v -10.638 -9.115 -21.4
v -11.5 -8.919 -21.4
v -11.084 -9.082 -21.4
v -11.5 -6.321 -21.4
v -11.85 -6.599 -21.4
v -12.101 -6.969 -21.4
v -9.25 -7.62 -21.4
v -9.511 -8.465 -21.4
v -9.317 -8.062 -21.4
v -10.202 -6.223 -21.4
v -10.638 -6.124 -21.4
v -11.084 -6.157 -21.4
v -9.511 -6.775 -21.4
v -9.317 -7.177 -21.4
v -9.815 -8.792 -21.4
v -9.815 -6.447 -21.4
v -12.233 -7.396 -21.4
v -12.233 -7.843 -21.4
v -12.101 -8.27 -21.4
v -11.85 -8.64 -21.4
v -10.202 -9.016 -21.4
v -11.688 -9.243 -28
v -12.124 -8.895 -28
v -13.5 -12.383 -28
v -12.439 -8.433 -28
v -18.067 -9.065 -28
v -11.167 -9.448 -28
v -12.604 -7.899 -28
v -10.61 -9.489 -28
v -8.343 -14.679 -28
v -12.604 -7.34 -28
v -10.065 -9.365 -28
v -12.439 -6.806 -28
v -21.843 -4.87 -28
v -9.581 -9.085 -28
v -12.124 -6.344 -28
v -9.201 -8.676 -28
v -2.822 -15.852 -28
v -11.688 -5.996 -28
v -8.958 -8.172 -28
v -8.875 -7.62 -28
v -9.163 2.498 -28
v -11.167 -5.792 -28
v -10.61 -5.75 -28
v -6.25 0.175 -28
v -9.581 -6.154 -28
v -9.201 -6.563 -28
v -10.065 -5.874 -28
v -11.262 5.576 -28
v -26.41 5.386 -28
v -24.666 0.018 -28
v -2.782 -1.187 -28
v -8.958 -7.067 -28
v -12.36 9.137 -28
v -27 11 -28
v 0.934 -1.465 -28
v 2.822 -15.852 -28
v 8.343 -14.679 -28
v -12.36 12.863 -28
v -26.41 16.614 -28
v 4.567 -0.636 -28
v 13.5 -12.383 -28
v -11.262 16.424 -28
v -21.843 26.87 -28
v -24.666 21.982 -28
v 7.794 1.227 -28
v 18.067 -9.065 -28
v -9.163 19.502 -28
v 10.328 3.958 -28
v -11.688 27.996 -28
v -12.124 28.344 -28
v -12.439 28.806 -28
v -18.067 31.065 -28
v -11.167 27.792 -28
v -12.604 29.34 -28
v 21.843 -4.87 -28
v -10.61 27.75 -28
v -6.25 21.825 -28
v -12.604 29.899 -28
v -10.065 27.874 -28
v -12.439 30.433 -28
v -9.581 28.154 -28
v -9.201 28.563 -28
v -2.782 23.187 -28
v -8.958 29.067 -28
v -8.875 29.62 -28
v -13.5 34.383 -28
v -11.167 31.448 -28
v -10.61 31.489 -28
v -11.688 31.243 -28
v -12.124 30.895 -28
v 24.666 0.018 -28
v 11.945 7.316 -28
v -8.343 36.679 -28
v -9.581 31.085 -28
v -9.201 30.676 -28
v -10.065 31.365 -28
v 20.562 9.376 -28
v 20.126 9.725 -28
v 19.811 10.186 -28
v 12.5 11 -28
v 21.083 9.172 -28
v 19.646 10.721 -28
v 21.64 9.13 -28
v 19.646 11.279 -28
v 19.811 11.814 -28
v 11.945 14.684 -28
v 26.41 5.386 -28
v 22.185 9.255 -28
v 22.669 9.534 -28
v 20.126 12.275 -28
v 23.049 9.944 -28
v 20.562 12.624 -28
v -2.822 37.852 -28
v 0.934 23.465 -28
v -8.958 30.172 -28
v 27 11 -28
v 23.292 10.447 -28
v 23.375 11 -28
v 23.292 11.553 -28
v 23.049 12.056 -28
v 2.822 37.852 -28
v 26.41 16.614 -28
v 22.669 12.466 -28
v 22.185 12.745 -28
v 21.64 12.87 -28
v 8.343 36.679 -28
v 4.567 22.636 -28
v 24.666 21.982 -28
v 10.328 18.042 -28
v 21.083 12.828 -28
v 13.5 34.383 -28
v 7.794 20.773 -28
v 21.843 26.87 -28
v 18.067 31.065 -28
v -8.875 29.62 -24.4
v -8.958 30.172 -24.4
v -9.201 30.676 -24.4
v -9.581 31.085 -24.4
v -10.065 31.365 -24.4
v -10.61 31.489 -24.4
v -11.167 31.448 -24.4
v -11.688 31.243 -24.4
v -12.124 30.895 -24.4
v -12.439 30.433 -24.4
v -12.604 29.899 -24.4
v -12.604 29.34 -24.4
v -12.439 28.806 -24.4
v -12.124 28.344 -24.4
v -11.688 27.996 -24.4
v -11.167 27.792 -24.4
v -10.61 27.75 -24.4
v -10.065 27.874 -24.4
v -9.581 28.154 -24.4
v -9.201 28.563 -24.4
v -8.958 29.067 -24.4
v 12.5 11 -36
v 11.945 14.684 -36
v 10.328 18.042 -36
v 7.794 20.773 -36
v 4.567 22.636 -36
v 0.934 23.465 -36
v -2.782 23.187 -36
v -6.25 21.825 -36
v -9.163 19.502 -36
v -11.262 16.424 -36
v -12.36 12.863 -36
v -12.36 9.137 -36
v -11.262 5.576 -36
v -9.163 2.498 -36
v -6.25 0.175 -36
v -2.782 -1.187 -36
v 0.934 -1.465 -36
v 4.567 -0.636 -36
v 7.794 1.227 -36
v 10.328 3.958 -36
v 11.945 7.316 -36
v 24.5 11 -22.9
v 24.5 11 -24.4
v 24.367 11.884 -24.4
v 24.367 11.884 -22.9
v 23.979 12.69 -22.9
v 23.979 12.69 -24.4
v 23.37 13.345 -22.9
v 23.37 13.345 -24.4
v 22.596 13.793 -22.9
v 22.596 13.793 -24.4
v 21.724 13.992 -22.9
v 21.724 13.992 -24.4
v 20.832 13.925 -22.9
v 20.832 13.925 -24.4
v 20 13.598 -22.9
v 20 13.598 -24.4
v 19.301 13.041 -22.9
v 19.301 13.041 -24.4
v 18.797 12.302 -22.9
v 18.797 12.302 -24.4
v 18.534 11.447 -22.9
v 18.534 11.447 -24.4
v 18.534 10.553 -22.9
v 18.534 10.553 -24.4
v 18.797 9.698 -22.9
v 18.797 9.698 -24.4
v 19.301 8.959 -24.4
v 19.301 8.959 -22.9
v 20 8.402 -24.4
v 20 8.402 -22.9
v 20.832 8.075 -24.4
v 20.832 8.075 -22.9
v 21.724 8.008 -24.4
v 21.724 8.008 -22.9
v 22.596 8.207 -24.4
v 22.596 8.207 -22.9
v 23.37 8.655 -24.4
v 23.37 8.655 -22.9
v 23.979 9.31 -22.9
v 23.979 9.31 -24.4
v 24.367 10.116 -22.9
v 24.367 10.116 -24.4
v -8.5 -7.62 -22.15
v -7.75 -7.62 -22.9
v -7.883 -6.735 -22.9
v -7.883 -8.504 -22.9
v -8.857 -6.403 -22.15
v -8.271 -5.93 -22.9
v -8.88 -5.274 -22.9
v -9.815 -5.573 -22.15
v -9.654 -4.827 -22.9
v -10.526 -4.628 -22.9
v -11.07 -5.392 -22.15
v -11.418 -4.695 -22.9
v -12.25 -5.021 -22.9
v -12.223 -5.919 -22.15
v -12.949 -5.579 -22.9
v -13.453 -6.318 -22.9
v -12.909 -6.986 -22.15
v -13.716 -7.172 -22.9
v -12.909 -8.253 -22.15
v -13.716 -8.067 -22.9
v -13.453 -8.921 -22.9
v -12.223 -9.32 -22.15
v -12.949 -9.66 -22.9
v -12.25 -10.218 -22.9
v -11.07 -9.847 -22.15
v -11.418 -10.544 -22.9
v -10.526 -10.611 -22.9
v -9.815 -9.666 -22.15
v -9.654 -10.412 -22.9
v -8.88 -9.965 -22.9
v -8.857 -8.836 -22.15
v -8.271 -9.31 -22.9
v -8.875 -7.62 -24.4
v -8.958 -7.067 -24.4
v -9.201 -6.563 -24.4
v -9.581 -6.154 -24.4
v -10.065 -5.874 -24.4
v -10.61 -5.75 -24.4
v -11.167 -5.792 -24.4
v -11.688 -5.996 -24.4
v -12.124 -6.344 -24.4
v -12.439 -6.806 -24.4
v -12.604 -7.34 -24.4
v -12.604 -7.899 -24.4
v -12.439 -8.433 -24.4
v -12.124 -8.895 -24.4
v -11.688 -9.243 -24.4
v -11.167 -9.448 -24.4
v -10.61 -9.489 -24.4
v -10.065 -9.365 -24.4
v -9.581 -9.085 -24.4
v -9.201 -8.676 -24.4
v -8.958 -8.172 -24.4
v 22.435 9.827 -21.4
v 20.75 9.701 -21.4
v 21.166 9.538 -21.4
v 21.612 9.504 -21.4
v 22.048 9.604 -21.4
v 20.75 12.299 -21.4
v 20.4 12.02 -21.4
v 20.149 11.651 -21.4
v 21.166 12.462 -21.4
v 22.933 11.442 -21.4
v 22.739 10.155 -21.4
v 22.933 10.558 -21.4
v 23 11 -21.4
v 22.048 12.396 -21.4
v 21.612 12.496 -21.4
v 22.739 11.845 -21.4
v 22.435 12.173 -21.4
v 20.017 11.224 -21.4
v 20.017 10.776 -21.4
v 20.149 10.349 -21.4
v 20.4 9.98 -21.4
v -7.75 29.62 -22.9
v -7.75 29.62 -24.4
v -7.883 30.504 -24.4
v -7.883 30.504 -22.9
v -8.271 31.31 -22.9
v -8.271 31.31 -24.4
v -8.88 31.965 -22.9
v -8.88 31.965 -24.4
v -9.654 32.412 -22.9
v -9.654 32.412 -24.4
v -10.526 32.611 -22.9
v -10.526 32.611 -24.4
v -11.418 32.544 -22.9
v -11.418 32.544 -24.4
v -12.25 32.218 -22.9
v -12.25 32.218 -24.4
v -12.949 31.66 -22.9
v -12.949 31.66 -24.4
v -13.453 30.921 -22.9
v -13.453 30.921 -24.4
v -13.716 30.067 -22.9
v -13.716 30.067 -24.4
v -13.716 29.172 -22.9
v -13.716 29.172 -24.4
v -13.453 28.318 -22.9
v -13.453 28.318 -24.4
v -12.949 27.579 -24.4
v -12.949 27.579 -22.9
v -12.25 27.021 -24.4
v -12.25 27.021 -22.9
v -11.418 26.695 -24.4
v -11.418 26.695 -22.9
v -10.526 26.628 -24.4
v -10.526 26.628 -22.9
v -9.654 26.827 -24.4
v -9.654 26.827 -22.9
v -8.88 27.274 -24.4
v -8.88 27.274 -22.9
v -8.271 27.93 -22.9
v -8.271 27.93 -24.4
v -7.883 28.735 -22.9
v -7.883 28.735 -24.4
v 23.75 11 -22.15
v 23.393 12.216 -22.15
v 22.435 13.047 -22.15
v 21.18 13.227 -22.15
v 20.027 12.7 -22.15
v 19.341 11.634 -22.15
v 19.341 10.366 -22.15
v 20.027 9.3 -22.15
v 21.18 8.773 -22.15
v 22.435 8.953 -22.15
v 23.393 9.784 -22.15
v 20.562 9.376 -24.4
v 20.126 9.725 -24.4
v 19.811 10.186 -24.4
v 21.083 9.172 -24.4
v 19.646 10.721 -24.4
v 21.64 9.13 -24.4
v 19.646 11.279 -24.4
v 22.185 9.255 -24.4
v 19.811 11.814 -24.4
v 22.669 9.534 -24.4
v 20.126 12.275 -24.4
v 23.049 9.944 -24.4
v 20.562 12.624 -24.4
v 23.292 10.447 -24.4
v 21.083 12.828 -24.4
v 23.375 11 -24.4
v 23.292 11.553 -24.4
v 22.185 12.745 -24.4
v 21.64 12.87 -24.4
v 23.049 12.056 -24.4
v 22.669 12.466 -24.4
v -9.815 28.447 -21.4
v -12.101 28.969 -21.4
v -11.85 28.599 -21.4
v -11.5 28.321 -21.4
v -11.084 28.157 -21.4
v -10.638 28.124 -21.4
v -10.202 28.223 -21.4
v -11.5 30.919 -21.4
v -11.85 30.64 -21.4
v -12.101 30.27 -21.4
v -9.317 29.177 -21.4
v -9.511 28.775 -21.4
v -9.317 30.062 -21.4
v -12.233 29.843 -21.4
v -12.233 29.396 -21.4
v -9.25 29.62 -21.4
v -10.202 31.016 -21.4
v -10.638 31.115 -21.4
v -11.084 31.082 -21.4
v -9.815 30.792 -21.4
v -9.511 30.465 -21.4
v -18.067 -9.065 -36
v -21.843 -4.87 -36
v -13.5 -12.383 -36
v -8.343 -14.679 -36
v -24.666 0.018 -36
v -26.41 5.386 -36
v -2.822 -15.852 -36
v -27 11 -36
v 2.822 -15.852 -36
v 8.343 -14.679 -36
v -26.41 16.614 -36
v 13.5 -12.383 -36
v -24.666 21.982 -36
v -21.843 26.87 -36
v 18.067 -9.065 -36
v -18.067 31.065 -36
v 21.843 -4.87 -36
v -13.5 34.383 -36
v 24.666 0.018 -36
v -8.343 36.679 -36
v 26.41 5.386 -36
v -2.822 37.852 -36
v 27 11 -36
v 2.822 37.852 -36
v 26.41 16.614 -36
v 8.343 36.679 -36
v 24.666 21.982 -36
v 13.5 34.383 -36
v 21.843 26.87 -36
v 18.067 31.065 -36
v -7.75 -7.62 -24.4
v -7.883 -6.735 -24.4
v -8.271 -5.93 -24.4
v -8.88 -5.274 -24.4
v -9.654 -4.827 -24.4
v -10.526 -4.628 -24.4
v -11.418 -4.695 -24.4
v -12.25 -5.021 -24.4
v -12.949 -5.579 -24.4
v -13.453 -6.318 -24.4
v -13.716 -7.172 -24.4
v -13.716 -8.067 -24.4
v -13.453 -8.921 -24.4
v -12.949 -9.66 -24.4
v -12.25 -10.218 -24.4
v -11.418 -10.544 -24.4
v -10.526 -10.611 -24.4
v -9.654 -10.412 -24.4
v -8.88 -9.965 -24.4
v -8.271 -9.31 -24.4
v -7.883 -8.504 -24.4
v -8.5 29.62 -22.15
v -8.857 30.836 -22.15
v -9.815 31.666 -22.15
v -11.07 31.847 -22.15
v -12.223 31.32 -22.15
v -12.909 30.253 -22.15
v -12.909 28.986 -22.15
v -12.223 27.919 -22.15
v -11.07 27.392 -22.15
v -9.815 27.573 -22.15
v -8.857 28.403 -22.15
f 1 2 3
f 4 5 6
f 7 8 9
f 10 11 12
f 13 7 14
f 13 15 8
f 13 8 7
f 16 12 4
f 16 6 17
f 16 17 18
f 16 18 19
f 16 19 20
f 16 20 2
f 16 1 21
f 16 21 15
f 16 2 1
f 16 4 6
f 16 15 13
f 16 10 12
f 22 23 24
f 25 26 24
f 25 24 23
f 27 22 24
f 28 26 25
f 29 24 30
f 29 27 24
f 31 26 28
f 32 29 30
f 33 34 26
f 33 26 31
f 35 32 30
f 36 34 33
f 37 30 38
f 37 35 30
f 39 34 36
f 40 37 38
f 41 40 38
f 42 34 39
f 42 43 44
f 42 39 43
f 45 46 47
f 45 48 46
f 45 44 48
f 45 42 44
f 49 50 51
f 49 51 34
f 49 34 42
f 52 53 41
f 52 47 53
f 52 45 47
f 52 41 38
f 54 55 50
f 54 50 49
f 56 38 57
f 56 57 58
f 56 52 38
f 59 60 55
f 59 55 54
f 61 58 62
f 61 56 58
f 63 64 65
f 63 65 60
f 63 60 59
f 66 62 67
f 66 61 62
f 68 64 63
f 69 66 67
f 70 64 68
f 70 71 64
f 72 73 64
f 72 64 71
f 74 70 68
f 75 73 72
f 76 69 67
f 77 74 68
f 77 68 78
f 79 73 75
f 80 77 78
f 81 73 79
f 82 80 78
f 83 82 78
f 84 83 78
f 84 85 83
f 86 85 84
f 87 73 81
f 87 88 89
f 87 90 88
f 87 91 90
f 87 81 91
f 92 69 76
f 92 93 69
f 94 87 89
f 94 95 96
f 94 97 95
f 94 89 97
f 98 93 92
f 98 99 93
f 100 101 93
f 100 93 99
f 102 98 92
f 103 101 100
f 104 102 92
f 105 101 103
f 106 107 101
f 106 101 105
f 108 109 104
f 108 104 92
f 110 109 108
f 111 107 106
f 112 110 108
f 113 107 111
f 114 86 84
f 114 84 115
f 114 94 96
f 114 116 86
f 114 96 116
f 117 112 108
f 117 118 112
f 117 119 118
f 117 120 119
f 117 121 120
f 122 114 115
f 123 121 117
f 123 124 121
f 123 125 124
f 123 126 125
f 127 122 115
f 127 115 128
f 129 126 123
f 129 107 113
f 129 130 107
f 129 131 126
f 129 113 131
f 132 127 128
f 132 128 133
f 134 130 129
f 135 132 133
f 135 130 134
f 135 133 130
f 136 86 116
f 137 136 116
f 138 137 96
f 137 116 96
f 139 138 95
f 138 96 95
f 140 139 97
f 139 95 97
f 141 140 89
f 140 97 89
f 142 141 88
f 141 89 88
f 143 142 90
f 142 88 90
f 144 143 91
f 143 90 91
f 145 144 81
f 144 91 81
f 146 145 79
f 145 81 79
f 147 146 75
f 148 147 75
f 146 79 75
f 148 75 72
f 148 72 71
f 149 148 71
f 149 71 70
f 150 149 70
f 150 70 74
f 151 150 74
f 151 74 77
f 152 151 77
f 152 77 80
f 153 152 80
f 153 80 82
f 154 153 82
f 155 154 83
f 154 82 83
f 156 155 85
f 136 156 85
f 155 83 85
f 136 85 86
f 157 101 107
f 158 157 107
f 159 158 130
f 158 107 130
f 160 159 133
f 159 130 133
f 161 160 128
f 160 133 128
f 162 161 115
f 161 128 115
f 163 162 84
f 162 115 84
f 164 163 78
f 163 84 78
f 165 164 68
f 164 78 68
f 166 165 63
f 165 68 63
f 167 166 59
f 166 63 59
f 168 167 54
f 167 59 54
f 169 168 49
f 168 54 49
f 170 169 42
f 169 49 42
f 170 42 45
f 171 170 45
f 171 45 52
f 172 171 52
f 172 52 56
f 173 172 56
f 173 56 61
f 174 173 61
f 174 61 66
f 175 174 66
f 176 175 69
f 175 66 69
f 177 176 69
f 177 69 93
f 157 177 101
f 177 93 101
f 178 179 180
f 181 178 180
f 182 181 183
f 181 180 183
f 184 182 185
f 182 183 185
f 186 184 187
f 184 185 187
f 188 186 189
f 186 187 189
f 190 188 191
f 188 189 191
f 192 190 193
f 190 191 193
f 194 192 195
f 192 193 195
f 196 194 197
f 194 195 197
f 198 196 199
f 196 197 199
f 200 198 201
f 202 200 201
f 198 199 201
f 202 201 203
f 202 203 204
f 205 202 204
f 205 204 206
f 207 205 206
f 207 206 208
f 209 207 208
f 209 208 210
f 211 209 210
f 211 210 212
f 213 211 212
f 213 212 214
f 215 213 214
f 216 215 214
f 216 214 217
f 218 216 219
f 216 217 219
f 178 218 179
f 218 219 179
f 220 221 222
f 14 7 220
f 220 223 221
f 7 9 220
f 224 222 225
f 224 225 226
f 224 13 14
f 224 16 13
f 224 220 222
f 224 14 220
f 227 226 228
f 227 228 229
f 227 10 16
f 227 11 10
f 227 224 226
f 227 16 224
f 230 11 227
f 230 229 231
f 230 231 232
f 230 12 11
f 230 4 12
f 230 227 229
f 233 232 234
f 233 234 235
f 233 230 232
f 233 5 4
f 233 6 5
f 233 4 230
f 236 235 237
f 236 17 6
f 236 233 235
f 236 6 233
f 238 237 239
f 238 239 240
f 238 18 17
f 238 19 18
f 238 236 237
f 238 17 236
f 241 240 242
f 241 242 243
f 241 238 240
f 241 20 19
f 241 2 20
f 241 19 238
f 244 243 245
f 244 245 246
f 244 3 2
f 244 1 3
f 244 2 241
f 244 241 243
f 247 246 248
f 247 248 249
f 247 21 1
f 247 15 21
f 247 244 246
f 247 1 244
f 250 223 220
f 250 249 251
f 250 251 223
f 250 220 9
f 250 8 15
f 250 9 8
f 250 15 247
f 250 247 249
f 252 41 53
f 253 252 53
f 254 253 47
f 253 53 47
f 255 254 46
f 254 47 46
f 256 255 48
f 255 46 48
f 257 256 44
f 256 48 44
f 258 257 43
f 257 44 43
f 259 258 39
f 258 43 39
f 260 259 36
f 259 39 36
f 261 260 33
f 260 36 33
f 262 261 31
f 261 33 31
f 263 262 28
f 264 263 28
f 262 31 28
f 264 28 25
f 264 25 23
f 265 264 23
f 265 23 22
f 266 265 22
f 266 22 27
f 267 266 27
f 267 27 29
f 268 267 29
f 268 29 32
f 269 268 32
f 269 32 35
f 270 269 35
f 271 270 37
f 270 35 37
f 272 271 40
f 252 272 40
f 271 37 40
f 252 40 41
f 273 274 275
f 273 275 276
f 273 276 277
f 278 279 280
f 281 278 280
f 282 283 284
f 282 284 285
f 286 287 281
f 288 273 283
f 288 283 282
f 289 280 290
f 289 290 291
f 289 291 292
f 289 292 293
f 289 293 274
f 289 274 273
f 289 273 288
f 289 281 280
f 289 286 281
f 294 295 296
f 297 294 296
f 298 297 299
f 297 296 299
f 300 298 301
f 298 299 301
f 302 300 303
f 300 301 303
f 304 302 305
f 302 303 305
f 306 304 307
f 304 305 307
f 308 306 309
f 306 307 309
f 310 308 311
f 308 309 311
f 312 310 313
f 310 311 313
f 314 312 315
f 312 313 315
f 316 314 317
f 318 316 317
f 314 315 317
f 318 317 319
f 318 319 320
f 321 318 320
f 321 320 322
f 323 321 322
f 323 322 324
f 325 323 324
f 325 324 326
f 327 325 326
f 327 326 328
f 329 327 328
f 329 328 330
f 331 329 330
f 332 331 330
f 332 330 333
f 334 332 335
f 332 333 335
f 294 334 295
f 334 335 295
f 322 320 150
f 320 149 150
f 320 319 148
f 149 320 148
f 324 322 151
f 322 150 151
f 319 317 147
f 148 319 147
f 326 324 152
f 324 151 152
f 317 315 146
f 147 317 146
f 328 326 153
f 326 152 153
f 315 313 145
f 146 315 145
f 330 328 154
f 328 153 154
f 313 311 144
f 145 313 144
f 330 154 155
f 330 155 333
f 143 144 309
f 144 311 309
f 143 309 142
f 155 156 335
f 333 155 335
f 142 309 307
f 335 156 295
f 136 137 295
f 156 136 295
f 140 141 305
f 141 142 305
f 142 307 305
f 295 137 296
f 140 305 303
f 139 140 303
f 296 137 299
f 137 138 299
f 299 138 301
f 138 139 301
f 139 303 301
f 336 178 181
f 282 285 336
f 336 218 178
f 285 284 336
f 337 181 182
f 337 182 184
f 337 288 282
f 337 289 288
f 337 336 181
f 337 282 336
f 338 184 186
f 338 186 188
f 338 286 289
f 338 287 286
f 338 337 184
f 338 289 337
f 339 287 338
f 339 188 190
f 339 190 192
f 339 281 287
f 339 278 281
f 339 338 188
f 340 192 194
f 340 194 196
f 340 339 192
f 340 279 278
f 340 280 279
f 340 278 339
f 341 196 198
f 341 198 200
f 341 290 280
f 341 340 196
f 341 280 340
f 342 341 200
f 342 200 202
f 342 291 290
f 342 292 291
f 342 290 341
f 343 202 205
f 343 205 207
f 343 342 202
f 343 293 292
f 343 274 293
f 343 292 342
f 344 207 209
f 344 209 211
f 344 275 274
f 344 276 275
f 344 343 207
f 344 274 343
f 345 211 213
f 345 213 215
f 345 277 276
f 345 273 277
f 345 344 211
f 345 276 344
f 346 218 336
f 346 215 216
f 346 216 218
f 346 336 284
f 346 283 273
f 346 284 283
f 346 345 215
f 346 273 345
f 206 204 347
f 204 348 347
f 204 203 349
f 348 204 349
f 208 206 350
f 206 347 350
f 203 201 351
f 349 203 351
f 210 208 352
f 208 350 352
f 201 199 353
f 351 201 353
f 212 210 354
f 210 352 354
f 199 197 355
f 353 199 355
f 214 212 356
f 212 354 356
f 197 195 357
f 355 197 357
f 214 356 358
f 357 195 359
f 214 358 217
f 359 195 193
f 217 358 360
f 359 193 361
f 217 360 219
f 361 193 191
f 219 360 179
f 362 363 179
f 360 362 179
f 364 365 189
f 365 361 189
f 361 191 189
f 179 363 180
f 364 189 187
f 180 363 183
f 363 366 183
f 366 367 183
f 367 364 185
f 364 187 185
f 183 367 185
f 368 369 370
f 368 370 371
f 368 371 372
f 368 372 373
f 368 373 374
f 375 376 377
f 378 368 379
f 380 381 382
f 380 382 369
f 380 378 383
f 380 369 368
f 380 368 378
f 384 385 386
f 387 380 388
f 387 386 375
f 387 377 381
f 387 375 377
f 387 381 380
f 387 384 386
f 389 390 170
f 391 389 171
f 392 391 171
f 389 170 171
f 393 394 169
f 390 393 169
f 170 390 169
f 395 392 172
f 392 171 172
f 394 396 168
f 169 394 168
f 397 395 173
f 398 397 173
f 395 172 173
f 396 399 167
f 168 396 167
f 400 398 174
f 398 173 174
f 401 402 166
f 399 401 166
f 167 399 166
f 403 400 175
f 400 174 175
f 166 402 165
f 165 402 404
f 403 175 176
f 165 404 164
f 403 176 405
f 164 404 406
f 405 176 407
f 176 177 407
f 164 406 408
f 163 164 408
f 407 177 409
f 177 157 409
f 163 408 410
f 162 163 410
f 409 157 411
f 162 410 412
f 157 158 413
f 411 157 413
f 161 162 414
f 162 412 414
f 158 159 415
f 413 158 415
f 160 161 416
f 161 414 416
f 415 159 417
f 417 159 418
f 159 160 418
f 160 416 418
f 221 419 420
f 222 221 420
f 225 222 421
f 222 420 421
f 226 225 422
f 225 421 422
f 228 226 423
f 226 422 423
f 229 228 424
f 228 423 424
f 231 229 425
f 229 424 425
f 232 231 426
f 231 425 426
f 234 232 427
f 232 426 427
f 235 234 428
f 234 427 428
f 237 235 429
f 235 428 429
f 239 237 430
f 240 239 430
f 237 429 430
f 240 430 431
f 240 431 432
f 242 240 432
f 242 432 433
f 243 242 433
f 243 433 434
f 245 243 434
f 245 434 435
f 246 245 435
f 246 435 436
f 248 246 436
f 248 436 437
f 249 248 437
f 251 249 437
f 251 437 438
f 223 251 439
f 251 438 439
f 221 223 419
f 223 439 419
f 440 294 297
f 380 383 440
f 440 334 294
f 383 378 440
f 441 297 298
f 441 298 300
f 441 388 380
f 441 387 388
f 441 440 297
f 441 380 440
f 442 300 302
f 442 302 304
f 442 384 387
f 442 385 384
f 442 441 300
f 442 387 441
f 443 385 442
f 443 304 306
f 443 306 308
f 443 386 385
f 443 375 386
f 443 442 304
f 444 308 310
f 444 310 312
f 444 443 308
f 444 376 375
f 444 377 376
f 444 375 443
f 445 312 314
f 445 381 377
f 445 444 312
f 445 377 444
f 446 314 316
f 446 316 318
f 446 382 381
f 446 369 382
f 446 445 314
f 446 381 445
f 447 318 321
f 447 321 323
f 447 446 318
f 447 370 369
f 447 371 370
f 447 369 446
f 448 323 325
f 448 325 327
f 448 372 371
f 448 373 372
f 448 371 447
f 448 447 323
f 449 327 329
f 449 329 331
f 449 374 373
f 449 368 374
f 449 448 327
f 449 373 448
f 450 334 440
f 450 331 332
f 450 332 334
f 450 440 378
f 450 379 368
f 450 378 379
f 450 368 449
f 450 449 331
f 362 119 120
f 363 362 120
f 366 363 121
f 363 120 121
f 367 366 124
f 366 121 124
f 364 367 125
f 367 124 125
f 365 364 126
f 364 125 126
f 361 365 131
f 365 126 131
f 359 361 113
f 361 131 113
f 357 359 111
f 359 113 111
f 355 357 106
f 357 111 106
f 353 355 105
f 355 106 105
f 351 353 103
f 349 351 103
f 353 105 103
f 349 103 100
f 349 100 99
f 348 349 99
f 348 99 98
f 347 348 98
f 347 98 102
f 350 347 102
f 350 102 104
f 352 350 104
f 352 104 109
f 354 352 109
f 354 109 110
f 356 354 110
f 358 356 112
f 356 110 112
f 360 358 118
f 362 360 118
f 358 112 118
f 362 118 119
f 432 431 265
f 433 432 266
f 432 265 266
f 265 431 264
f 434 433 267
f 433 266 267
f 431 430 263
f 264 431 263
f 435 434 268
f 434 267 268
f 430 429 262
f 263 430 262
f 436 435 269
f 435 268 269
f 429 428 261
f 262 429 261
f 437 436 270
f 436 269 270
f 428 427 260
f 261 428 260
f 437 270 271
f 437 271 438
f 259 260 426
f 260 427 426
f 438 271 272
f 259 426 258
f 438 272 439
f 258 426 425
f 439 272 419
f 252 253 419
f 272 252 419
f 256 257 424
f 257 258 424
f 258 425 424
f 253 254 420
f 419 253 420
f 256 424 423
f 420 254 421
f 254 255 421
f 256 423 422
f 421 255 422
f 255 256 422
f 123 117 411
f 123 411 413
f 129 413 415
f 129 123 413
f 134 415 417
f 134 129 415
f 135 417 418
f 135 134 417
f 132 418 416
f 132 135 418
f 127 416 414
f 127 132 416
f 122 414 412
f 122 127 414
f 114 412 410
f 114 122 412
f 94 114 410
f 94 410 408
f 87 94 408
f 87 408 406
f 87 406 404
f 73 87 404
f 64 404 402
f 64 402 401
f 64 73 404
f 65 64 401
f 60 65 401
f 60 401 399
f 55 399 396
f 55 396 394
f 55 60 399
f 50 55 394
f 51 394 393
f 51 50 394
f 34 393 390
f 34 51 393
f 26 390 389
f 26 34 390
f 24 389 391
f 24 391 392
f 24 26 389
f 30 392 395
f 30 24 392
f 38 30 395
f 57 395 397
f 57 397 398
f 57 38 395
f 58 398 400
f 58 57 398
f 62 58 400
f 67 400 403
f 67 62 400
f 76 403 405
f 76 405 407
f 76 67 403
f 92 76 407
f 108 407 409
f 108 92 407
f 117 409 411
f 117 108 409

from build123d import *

# Parameters (mm, degrees)
SKETCH012_R     = 27
SKETCH012_R_2   = 12.5
PAD003_DEPTH    = 8
SKETCH013_R     = 1.875
PAD004_DEPTH    = 3.6
SKETCH014_R     = 3
PAD005_DEPTH    = 3
CHAMFER004_SIZE = 1.5


with BuildPart() as part:
    # Sketch012 → Pad003 (new body)
    with BuildSketch(Plane.XY):
        Circle(SKETCH012_R)
        Circle(SKETCH012_R_2, mode=Mode.SUBTRACT)
    extrude(amount=-PAD003_DEPTH)

    # Sketch013 → Pad004 (join)
    with BuildSketch(Plane.XY):
        with Locations((-10.75, 18.619546)):
            Circle(SKETCH013_R)
        with Locations((-10.75, -18.619546)):
            Circle(SKETCH013_R)
        with Locations((21.5, 0)):
            Circle(SKETCH013_R)
    extrude(amount=PAD004_DEPTH)

    # Sketch014 (on DatumPlane) → Pad005 (join)
    with BuildSketch(Plane.XY.offset(3.6)):
        with Locations((-10.75, 18.619546)):
            Circle(SKETCH014_R)
        with Locations((21.5, 0)):
            Circle(SKETCH014_R)
        with Locations((-10.75, -18.619546)):
            Circle(SKETCH014_R)
    extrude(amount=PAD005_DEPTH)

    # Chamfer004
    chamfer004_edges = [part.edges().sort_by_distance(p)[0] for p in [
        (18.5, 0, 6.6),
        (-13.75, 18.619546, 6.6),
        (-13.75, -18.619546, 6.6),
    ]]
    chamfer(chamfer004_edges, length=CHAMFER004_SIZE)


with BuildPart() as part_1:
    # Body001 placement: moved
    add(part.part.moved(Location((0, 11, -28))))


solid = part_1.part
